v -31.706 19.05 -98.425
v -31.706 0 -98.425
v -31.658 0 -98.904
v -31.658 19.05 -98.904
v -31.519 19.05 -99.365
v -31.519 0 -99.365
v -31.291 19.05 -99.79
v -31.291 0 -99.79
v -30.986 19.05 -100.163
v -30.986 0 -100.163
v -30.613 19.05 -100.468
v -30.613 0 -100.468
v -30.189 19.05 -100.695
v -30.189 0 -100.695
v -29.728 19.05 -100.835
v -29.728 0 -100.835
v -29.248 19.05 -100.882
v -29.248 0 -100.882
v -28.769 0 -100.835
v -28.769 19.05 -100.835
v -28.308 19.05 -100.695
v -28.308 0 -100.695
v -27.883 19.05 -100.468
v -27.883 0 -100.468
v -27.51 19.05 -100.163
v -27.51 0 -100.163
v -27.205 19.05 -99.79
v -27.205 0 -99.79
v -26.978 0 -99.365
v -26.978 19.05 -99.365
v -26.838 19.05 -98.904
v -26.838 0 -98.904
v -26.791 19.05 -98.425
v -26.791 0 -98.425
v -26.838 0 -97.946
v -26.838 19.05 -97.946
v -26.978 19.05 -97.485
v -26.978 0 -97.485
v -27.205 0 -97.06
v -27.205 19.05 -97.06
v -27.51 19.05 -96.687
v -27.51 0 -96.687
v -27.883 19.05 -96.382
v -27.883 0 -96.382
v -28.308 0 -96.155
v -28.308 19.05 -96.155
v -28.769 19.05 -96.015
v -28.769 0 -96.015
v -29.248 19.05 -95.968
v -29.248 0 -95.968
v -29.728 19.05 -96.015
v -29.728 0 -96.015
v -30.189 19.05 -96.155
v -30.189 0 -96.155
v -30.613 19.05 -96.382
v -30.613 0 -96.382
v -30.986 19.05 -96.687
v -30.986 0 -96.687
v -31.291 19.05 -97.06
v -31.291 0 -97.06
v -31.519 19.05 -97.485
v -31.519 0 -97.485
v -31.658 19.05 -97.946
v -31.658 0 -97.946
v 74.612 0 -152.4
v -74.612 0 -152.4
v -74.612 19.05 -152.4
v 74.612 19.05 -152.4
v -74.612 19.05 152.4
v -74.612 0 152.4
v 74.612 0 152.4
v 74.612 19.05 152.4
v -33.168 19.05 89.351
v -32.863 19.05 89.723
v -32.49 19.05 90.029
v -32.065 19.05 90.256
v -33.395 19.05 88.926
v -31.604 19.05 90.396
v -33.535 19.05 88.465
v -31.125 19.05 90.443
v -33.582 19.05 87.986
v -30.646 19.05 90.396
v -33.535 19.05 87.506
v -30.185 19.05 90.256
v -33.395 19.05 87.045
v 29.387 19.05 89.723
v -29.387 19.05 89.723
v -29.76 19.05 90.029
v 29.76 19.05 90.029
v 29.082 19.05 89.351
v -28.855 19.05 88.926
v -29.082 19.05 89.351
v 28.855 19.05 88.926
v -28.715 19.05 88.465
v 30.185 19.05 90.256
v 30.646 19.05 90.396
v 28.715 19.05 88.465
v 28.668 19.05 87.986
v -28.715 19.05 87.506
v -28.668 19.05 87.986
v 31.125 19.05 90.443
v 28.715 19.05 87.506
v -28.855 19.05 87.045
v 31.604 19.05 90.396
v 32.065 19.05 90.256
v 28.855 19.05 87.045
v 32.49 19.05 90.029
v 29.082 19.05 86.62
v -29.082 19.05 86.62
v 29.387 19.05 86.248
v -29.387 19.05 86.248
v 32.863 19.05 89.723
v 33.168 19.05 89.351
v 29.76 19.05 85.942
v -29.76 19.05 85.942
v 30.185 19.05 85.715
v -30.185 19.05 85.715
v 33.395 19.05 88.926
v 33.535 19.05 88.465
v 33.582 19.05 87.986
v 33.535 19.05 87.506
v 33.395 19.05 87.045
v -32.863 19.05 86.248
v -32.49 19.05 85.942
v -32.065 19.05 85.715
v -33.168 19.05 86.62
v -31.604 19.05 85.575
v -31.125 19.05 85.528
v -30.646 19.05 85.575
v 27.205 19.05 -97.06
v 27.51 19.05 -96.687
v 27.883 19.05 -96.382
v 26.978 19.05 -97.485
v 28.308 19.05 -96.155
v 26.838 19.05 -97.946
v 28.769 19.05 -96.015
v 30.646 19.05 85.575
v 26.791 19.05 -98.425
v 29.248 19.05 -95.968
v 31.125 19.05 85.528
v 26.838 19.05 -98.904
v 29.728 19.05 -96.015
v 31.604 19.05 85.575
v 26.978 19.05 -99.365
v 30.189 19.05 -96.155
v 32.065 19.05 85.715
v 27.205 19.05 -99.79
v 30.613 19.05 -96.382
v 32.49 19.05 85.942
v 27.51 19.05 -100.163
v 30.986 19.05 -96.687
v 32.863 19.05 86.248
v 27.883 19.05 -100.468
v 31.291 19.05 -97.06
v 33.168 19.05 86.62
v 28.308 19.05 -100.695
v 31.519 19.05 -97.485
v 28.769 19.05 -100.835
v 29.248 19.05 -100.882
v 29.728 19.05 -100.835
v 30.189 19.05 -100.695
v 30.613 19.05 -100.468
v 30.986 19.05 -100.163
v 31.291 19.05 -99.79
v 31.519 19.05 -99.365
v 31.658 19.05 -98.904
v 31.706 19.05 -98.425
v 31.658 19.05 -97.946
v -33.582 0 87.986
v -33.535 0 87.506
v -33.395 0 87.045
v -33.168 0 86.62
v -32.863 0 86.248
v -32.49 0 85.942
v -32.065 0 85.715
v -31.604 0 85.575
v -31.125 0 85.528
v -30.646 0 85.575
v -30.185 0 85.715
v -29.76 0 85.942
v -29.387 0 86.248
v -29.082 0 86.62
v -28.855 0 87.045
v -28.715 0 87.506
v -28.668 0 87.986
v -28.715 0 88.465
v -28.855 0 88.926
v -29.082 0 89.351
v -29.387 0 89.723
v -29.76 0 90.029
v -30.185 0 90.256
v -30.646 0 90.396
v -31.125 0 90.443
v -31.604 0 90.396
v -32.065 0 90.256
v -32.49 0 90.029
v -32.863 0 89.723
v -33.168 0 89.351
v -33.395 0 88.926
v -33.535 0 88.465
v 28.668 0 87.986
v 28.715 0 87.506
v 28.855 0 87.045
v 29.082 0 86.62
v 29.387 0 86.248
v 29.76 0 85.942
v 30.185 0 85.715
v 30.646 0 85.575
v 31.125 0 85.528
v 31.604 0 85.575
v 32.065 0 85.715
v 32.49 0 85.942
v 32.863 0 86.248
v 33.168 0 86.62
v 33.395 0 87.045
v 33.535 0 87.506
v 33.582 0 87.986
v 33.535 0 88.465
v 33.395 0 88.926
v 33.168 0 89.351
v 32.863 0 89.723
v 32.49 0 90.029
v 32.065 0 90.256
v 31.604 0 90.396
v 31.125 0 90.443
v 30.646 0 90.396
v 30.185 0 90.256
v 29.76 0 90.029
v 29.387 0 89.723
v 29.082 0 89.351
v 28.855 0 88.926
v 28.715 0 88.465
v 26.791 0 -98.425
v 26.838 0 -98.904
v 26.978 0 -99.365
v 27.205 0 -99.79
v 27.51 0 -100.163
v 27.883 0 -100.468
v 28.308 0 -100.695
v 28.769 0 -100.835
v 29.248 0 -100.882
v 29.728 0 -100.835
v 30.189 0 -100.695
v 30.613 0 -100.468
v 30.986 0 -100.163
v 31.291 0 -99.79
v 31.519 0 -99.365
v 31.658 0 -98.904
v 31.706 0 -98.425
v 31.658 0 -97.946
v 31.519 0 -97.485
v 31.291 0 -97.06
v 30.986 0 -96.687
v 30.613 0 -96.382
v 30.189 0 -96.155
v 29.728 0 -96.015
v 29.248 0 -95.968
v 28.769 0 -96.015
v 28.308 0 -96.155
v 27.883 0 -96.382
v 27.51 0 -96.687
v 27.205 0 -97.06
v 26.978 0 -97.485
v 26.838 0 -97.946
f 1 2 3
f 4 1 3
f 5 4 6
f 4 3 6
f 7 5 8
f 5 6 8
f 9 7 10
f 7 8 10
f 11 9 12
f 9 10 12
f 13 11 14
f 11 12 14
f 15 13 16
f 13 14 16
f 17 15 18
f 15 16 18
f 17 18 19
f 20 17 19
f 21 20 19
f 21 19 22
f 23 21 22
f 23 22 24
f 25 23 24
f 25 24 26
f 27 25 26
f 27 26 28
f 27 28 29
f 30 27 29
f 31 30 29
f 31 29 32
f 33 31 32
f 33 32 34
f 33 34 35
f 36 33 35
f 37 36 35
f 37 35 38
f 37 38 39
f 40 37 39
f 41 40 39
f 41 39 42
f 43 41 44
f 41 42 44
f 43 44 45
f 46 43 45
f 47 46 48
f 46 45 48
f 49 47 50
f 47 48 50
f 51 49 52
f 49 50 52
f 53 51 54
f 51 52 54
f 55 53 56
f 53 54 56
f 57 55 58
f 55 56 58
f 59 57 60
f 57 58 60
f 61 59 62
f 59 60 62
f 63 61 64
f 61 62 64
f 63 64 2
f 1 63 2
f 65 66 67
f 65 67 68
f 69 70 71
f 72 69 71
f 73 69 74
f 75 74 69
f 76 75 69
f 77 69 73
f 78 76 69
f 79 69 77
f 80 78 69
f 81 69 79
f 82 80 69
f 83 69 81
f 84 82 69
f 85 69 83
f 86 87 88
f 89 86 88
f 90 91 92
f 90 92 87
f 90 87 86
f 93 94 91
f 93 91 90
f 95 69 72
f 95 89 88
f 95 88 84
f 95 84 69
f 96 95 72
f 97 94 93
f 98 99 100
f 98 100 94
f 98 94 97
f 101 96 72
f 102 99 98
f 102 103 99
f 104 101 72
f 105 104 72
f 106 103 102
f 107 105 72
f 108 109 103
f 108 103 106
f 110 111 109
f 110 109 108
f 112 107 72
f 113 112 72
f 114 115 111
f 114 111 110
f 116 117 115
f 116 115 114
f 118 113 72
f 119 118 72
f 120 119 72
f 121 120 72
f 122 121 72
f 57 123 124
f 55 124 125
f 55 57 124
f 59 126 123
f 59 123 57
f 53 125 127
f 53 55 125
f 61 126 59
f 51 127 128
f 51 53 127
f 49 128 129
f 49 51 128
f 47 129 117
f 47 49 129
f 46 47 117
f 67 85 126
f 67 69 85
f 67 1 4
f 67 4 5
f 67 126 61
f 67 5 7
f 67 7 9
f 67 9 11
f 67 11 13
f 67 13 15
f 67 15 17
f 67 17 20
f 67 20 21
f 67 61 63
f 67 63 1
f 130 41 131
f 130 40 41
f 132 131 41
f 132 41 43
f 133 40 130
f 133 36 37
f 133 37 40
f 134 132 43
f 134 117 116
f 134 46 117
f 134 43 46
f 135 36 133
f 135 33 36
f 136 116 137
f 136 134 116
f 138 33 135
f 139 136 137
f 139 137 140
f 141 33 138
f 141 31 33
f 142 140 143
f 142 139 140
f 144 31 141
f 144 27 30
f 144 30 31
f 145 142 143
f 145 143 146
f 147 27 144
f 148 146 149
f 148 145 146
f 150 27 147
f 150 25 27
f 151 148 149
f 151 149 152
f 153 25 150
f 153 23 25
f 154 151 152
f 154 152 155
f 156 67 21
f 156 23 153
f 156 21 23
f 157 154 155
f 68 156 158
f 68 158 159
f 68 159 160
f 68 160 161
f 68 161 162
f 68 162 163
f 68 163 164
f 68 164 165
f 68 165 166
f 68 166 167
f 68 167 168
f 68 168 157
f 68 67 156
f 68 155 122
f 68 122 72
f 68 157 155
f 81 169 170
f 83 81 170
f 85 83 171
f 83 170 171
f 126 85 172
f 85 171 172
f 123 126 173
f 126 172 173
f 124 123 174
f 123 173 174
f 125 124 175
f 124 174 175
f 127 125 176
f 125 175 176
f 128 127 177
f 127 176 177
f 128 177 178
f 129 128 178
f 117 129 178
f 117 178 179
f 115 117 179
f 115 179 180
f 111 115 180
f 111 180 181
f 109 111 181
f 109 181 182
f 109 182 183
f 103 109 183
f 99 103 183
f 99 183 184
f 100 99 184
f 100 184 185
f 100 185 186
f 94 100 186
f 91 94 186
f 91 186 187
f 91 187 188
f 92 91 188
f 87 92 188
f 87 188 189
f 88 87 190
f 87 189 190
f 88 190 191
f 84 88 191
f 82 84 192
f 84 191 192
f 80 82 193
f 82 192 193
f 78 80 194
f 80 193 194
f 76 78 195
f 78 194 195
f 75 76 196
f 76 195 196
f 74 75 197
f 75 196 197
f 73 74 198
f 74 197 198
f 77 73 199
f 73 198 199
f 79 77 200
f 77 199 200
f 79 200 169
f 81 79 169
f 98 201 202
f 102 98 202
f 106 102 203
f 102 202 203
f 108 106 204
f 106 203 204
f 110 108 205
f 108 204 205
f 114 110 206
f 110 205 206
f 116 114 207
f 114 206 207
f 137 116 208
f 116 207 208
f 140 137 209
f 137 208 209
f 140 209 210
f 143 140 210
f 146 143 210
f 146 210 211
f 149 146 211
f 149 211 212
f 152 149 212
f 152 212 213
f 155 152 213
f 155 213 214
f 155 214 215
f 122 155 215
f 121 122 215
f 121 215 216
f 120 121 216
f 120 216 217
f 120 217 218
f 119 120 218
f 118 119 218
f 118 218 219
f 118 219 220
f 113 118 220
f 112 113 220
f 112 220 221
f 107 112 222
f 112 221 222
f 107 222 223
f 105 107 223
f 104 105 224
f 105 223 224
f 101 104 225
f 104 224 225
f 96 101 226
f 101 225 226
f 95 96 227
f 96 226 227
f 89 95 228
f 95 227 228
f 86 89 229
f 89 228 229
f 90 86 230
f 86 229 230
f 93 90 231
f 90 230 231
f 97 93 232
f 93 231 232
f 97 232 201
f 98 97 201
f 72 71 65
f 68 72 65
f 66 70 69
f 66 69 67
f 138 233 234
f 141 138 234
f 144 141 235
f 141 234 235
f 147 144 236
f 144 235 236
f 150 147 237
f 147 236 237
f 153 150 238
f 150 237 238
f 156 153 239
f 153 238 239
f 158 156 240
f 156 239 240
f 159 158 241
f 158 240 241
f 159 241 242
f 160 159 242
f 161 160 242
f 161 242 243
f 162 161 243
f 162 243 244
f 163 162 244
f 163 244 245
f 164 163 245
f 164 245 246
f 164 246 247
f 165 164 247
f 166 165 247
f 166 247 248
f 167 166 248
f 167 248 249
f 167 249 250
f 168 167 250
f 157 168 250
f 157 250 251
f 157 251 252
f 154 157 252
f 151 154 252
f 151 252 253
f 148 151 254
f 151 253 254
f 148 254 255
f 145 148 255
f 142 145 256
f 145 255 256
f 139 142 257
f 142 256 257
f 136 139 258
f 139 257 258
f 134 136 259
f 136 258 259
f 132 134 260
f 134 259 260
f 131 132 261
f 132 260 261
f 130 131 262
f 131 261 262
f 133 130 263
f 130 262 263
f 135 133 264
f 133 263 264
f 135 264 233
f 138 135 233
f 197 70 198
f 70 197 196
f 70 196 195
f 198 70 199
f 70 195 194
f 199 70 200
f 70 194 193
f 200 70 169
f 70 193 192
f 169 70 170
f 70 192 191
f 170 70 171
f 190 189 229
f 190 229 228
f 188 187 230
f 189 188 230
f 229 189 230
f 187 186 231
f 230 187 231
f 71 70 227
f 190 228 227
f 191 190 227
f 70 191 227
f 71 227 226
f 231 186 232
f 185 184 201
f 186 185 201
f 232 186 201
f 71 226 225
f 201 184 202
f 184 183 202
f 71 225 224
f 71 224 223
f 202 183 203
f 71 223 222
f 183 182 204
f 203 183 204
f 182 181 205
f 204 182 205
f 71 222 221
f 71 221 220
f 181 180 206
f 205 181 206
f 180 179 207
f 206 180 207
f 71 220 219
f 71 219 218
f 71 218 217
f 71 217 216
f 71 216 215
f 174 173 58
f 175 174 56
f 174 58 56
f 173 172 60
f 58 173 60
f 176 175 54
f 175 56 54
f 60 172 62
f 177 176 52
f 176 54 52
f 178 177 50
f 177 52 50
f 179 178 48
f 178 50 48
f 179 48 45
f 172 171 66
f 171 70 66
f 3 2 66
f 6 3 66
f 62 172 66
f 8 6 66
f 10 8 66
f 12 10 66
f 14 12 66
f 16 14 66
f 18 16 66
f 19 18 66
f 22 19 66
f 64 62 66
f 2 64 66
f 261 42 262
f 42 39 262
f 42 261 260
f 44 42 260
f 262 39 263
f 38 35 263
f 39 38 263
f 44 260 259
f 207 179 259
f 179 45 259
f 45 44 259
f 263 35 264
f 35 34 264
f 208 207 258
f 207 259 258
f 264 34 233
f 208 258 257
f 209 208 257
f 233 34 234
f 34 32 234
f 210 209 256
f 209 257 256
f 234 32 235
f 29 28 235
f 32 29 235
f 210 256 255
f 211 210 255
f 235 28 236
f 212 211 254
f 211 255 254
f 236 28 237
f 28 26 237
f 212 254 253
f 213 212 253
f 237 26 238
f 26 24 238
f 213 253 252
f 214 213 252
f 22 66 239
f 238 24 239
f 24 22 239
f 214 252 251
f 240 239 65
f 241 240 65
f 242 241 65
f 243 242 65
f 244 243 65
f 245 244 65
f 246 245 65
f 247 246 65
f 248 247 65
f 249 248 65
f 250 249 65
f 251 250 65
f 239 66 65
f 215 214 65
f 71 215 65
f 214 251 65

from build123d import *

# Parameters (mm, degrees)
SKETCH1_W             = 149.225
SKETCH1_H             = 304.8
BOSS_EXTRUDE1_DEPTH   = 19.05
F_8_CLEARANCE_HOLE1_D = 4.9149
F_8_CLEARANCE_HOLE2_D = 4.9149


with BuildPart() as part:
    # Sketch1 → Boss-Extrude1 (new body)
    with BuildSketch(Plane(origin=(0, 0, 0), x_dir=(1, 0, 0), z_dir=(0, 1, 0))):
        Rectangle(SKETCH1_W, SKETCH1_H)
    extrude(amount=BOSS_EXTRUDE1_DEPTH)

    # #8 Clearance Hole1 (through all)
    with Locations(Plane(origin=(0, 19.05, 0), x_dir=(1, 0, 0), z_dir=(0, 1, 0))):
        with Locations((-29.248151984, 98.425), (29.248151984, 98.425)):
            Hole(F_8_CLEARANCE_HOLE1_D / 2)

    # #8 Clearance Hole2 (through all)
    with Locations(Plane(origin=(0, 19.05, 0), x_dir=(1, 0, 0), z_dir=(0, 1, 0))):
        with Locations((-31.125, -87.9856), (31.125, -87.9856)):
            Hole(F_8_CLEARANCE_HOLE2_D / 2)


solid = part.part
